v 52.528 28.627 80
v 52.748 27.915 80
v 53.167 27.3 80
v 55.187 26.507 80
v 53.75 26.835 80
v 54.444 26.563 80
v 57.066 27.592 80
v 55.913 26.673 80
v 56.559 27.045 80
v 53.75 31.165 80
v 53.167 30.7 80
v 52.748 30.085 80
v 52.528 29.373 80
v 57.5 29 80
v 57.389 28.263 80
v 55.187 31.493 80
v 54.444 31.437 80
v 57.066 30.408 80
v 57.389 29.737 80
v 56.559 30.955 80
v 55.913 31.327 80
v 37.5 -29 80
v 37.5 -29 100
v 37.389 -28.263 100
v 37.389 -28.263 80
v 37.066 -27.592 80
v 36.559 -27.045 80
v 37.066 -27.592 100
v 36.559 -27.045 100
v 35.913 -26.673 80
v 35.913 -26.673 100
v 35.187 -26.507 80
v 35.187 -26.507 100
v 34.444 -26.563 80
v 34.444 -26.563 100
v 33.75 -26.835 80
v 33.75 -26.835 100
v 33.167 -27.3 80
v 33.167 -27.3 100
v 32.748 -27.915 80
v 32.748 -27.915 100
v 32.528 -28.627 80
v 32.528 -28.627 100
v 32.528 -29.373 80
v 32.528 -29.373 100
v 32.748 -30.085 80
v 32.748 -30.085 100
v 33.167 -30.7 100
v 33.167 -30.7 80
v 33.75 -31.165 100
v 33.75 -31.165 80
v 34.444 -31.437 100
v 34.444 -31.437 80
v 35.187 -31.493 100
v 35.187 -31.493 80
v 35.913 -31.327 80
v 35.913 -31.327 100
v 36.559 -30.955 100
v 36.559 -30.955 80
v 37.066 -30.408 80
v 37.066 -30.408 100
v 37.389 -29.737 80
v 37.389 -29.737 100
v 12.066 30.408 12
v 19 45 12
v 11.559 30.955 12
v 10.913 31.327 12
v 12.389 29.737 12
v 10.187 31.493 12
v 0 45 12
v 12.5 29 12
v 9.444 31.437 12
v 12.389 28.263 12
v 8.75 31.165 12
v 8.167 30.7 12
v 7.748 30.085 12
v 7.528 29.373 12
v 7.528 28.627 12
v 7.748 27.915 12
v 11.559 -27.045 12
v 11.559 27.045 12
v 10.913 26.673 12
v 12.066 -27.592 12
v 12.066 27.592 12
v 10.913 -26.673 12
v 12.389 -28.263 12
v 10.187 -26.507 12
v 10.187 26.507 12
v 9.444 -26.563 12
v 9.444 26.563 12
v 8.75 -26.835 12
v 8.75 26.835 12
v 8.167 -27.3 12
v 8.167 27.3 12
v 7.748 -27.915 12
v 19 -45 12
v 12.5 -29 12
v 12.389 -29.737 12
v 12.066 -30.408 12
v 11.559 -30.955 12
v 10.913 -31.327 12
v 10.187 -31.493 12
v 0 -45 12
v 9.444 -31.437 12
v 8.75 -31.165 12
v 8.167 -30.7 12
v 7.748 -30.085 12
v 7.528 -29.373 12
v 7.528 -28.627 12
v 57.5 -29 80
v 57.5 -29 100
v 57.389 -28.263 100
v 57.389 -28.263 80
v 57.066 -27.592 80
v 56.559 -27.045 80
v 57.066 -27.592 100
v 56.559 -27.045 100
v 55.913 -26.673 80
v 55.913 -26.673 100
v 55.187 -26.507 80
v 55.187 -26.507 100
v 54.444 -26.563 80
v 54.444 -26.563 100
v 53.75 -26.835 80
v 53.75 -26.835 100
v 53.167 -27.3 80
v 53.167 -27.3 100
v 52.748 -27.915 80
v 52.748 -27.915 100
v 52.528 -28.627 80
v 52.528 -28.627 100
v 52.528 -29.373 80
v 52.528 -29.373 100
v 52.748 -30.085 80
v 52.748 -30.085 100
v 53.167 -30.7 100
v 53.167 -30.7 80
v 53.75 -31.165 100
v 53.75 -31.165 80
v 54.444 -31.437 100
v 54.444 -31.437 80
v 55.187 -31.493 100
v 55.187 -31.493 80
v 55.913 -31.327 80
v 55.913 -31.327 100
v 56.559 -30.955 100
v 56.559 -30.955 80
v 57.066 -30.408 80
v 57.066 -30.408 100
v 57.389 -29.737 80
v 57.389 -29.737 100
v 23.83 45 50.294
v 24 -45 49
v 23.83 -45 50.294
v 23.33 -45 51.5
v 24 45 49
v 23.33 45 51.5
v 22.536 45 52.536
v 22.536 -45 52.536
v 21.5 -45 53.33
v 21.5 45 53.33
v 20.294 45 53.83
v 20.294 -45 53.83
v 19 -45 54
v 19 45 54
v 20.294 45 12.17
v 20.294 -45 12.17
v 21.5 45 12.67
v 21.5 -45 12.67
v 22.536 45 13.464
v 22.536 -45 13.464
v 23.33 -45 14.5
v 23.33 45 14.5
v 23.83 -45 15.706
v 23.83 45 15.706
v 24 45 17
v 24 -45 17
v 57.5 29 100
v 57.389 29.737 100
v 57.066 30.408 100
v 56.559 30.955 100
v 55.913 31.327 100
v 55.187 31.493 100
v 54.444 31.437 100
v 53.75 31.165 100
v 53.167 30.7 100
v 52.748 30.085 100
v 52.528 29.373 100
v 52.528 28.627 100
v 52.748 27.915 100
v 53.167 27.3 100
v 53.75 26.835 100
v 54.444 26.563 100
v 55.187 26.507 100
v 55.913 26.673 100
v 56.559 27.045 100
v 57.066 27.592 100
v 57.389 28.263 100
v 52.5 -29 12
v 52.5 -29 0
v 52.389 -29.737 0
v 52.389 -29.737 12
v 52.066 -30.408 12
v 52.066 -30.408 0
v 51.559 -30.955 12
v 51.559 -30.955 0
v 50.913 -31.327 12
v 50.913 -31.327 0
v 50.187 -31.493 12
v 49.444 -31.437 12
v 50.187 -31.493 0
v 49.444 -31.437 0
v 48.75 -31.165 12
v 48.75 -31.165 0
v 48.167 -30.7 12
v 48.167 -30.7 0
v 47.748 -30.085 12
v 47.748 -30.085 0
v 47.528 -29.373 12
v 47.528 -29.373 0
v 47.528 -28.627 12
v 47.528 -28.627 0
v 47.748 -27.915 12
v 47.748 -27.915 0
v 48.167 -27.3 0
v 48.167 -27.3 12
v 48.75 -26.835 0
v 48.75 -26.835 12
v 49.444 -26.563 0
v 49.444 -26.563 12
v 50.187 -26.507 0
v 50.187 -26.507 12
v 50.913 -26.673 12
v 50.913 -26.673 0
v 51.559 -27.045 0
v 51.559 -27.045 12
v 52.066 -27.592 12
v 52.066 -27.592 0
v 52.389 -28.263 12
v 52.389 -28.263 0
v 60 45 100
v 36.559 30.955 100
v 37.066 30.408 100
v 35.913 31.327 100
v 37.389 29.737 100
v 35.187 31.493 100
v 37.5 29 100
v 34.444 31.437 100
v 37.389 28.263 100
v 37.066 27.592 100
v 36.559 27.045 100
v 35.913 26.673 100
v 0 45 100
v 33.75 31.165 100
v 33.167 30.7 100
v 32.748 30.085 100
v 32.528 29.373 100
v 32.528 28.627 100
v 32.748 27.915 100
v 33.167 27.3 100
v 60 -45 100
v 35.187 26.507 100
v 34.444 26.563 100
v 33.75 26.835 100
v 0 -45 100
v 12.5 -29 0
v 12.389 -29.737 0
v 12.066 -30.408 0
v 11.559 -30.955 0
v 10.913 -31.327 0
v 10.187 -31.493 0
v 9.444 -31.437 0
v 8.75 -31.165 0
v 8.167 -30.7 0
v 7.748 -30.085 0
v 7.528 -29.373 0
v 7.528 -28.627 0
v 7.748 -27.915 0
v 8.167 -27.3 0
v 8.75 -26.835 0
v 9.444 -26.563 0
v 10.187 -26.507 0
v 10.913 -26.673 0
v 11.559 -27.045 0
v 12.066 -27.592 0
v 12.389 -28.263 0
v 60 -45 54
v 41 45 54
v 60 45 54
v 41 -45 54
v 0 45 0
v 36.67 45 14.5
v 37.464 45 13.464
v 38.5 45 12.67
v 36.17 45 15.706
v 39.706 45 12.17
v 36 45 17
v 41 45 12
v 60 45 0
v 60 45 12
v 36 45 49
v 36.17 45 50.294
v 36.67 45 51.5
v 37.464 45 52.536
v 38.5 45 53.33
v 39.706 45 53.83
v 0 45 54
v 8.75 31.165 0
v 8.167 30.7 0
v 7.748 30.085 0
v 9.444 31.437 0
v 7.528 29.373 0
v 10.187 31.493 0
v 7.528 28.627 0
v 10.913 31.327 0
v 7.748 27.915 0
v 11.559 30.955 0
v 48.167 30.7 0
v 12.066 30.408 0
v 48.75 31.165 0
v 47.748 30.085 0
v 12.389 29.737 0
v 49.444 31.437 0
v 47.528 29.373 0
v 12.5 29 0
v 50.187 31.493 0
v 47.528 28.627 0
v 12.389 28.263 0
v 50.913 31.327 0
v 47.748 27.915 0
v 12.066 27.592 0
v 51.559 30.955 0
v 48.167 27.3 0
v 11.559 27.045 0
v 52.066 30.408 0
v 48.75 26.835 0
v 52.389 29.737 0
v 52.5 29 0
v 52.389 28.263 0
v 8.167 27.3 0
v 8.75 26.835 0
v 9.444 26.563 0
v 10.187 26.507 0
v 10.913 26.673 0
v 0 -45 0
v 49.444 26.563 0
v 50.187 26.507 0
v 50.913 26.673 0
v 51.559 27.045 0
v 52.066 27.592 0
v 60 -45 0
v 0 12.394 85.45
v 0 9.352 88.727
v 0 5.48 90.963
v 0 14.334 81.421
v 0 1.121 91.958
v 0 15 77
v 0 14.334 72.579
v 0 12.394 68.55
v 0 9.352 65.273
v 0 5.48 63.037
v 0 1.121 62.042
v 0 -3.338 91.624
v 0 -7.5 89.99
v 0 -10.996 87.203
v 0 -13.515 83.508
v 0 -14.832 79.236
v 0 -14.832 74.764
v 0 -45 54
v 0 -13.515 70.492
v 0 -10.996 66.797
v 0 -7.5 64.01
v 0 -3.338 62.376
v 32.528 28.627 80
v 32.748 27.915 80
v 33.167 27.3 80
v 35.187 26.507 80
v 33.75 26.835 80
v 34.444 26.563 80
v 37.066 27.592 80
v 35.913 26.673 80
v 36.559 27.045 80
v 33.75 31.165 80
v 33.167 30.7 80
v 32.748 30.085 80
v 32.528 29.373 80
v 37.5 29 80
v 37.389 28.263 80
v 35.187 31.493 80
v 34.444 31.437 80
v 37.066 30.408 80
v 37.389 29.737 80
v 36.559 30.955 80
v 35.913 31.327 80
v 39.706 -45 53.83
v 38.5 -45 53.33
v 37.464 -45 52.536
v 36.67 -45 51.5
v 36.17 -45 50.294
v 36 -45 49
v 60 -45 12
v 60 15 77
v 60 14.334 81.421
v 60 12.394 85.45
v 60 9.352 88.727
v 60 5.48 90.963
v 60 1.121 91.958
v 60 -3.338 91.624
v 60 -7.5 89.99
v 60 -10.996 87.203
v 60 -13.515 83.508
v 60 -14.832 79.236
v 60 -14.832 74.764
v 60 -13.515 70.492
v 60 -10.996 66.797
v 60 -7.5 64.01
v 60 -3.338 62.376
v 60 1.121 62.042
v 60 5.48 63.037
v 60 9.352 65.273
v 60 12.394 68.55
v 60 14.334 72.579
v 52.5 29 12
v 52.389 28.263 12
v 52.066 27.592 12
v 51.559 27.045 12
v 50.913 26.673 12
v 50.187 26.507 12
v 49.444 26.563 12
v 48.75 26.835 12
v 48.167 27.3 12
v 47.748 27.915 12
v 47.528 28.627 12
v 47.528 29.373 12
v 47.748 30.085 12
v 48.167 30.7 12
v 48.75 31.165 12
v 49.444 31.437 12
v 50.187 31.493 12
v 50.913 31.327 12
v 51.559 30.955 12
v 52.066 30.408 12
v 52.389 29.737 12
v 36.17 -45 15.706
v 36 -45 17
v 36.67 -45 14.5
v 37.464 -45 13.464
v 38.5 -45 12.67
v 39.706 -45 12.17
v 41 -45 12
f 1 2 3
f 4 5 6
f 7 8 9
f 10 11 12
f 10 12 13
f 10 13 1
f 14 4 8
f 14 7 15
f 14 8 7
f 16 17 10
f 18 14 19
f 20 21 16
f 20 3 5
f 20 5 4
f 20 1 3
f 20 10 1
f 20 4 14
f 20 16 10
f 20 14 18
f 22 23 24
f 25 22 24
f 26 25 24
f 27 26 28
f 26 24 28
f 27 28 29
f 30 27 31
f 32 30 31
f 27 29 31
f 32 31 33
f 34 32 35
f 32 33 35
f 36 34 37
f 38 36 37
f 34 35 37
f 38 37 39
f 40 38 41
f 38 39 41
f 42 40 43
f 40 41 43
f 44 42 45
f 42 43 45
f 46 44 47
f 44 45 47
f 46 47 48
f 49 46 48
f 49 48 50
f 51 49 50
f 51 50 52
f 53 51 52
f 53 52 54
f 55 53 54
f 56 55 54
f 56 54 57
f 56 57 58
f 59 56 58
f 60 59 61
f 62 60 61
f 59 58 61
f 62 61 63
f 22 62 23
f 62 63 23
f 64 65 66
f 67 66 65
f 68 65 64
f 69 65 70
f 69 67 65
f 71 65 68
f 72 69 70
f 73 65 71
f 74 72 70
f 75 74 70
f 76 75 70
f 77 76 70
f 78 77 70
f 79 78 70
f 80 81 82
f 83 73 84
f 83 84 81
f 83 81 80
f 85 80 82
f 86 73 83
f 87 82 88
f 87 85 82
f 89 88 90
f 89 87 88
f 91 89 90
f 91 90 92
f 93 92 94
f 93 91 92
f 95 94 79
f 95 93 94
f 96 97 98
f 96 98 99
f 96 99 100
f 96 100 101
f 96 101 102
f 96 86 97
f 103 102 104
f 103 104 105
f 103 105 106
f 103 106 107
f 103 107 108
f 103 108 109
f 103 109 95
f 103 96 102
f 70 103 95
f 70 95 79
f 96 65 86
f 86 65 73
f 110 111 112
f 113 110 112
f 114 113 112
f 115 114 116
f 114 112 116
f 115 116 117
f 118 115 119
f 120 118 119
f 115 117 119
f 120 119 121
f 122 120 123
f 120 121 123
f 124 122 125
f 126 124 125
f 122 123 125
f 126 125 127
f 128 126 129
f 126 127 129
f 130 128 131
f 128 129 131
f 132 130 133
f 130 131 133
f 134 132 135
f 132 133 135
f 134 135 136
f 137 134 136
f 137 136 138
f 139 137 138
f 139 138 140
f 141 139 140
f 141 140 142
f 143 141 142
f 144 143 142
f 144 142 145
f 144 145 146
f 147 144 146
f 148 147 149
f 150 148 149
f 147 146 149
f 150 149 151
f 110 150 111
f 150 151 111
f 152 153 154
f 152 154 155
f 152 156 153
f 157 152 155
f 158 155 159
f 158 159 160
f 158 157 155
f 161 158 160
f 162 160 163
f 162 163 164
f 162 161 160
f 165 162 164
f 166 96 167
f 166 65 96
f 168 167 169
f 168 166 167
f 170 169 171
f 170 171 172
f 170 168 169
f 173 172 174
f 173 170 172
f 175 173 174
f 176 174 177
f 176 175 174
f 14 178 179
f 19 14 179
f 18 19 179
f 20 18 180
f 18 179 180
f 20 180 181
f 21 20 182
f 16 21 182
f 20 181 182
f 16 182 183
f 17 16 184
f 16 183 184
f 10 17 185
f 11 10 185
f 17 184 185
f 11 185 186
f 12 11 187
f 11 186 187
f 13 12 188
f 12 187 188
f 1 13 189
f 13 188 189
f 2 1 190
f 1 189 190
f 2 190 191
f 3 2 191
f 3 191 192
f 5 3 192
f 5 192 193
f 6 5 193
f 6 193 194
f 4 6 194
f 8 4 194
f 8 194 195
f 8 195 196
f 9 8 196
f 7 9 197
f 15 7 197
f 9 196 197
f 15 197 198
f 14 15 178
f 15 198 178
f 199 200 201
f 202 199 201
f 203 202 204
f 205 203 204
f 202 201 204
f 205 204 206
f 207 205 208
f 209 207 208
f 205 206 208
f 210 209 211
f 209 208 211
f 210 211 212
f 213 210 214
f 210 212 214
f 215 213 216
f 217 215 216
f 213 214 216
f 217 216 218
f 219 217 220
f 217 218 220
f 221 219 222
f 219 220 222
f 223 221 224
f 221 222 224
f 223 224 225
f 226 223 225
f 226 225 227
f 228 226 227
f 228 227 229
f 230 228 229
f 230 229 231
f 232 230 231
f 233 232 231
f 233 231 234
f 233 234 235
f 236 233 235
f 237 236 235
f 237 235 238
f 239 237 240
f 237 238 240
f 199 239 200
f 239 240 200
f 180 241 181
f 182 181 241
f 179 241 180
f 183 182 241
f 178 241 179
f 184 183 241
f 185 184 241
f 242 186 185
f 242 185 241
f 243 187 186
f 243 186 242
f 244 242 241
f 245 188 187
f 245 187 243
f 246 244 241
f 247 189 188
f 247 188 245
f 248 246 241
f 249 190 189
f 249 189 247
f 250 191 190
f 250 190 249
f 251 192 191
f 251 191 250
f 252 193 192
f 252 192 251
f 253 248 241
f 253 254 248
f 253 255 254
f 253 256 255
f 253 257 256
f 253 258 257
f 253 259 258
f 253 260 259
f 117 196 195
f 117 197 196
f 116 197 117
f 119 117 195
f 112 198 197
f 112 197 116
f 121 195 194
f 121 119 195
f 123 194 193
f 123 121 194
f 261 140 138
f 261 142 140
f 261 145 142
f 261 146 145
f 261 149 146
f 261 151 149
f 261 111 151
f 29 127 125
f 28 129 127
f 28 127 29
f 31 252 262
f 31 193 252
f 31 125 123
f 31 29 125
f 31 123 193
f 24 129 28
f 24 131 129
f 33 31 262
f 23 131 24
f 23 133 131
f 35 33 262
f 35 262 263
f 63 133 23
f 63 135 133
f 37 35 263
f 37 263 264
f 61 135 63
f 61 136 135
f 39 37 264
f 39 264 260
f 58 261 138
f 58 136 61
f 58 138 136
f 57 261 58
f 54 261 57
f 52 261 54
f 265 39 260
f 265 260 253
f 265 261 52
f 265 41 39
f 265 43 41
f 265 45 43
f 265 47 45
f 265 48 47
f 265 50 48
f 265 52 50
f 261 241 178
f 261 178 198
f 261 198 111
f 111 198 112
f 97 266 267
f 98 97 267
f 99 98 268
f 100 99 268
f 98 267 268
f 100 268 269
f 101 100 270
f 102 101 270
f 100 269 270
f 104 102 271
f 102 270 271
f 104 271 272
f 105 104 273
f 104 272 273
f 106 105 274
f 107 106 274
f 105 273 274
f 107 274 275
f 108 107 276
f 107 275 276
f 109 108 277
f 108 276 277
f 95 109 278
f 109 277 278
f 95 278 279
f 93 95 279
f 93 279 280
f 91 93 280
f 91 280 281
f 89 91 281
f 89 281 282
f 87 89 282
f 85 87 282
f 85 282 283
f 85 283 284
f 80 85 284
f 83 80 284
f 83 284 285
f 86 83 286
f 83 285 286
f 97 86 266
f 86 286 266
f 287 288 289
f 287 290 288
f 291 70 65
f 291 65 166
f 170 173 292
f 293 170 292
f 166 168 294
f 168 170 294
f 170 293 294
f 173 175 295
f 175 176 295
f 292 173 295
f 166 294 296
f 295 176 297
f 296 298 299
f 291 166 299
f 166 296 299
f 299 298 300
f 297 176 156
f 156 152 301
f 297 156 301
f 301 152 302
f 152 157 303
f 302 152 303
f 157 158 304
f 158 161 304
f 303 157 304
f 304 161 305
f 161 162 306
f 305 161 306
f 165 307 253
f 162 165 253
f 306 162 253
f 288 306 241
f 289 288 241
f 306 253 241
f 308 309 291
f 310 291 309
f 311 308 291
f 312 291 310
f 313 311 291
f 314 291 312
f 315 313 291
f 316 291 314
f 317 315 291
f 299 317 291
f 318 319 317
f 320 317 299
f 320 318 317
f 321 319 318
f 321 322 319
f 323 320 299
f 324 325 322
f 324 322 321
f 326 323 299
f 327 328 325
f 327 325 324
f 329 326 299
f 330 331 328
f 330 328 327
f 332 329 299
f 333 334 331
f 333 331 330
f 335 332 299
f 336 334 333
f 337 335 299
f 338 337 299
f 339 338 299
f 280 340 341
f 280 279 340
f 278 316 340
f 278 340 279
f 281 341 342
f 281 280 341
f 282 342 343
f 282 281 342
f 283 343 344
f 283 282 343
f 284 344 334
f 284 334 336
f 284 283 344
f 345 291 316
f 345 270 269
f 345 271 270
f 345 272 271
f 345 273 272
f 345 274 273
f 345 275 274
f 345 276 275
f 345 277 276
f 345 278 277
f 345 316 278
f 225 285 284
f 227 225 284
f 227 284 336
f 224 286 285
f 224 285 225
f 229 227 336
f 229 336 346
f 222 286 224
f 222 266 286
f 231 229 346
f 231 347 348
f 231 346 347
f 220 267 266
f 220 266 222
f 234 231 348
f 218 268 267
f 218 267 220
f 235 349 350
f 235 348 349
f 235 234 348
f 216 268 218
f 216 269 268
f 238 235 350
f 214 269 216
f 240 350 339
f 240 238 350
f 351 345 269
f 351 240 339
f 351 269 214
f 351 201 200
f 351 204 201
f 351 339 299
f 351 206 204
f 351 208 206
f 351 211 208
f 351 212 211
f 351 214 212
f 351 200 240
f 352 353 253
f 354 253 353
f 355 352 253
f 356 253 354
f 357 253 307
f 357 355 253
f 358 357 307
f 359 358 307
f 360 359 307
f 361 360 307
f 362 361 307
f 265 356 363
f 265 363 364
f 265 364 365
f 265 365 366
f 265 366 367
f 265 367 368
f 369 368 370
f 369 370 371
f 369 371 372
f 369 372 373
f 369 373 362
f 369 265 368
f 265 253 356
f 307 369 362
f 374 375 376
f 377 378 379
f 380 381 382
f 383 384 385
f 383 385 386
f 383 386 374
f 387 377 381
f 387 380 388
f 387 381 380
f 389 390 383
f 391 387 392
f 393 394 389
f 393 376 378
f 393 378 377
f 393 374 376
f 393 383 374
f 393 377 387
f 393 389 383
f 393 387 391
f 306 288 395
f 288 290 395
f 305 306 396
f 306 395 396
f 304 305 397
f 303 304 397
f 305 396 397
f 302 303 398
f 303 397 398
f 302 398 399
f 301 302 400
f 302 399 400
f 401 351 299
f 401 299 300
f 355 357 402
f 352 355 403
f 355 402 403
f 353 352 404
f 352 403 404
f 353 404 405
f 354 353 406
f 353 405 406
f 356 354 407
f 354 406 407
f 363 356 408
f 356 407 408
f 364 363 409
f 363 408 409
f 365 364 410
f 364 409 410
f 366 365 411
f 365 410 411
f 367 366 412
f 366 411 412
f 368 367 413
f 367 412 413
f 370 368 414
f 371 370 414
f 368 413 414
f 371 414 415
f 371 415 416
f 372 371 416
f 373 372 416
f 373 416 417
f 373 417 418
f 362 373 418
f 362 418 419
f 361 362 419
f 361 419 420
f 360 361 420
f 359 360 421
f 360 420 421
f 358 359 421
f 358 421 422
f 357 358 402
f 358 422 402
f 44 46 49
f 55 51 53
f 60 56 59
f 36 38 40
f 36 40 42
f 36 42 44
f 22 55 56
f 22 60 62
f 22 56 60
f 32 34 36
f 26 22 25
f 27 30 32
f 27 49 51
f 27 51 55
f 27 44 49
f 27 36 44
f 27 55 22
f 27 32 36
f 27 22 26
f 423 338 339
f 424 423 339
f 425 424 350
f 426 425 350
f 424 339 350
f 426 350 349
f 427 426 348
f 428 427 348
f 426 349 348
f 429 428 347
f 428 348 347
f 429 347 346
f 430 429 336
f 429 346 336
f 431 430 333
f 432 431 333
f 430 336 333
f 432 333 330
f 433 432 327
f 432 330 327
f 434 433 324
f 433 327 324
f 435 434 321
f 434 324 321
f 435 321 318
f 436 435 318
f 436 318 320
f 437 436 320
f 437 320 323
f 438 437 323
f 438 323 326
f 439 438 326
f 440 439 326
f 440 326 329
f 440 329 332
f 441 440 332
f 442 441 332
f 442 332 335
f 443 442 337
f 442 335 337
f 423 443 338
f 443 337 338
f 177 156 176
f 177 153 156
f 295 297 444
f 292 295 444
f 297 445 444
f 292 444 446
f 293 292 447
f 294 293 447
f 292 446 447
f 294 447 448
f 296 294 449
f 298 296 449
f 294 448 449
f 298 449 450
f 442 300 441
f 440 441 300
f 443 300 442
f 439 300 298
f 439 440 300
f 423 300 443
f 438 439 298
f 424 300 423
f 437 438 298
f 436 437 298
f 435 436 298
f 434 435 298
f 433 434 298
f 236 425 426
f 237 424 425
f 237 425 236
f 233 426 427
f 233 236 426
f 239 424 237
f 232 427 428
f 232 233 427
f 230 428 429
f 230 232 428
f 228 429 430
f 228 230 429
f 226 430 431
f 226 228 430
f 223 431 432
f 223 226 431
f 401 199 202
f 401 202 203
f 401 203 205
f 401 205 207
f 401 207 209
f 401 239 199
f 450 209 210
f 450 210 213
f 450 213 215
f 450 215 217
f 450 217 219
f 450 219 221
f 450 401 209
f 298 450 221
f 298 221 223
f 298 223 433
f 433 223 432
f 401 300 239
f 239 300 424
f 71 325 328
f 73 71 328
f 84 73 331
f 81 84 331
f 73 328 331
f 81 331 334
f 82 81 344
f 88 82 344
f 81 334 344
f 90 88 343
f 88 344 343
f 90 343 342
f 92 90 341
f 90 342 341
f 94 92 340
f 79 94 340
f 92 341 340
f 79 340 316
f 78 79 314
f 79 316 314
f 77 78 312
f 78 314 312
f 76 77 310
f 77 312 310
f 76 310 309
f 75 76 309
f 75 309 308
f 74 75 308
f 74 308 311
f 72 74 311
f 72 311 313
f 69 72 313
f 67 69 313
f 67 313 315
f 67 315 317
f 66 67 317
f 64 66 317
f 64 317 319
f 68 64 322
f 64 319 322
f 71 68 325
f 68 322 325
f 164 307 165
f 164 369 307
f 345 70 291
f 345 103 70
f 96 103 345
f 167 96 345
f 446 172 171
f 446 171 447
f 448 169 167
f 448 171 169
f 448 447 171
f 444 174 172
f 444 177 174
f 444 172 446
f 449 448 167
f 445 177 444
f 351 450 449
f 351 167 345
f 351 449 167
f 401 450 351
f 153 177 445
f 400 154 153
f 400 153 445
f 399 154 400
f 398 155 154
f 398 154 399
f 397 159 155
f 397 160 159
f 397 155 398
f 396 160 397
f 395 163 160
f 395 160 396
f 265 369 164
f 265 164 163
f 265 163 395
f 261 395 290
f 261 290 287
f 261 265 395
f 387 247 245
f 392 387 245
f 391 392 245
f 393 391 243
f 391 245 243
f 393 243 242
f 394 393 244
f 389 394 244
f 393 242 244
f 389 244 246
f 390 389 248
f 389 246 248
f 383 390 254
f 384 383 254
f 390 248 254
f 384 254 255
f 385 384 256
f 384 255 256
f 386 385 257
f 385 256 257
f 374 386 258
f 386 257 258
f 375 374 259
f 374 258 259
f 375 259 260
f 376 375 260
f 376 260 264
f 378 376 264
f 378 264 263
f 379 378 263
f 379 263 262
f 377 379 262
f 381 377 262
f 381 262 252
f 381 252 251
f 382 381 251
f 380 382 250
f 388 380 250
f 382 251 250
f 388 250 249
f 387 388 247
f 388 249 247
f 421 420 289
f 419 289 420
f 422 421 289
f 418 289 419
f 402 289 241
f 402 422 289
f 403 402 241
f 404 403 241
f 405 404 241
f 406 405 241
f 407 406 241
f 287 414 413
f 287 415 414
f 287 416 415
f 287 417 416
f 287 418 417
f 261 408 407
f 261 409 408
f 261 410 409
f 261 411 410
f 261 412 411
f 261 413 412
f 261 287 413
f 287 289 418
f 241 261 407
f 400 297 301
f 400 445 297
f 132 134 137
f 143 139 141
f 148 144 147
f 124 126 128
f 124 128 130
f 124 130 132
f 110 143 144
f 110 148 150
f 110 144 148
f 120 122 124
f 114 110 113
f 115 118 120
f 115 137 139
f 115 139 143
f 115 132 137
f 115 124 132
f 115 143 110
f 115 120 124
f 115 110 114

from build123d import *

# Parameters (mm, degrees)
F1_DEPTH      = 45
F1_DEPTH_BACK = 45
F2_R          = 5
F3_R          = 15
F4_DEPTH      = 60
F5_R          = 2.5
F6_DEPTH      = 12
F7_R          = 2.5
F8_DEPTH      = 20


with BuildPart() as f1:
    # F0 (on Front) → F1 (new body, two sides)
    with BuildSketch(Plane.XZ) as f1_sk:
        Polygon((0, 12), (0, 0), (60, 0), (60, 12), (36, 12), (36, 54), (60, 54), (60, 100), (0, 100), (0, 54), (24, 54), (24, 12), align=None)
    extrude(amount=F1_DEPTH)
    extrude(f1_sk.sketch, amount=-F1_DEPTH_BACK)

    # F2
    f2_edges = [f1.edges().sort_by_distance(p)[0] for p in [
        (36, 0, 54),
        (36, 0, 12),
        (24, 0, 12),
        (24, 0, 54),
    ]]
    fillet(f2_edges, radius=F2_R)

    # F3 (on face) → F4 (cut)
    with BuildSketch(Plane.YZ.offset(60)):
        with Locations((0, 77)):
            Circle(F3_R)
    extrude(amount=-F4_DEPTH, mode=Mode.SUBTRACT)

    # F5 (on face) → F6 (cut)
    with BuildSketch(Plane(origin=(0, 0, 0), x_dir=(1, 0, 0), z_dir=(0, 0, -1))):
        with Locations((10, 29)):
            Circle(F5_R)
        with Locations((10, -29)):
            Circle(F5_R)
        with Locations((50, -29)):
            Circle(F5_R)
        with Locations((50, 29)):
            Circle(F5_R)
    extrude(amount=-F6_DEPTH, mode=Mode.SUBTRACT)

    # F7 (on face) → F8 (cut)
    with BuildSketch(Plane.XY.offset(100)):
        with Locations((35, 29)):
            Circle(F7_R)
        with Locations((55, 29)):
            Circle(F7_R)
        with Locations((55, -29)):
            Circle(F7_R)
        with Locations((35, -29)):
            Circle(F7_R)
    extrude(amount=-F8_DEPTH, mode=Mode.SUBTRACT)


solid = f1.part
